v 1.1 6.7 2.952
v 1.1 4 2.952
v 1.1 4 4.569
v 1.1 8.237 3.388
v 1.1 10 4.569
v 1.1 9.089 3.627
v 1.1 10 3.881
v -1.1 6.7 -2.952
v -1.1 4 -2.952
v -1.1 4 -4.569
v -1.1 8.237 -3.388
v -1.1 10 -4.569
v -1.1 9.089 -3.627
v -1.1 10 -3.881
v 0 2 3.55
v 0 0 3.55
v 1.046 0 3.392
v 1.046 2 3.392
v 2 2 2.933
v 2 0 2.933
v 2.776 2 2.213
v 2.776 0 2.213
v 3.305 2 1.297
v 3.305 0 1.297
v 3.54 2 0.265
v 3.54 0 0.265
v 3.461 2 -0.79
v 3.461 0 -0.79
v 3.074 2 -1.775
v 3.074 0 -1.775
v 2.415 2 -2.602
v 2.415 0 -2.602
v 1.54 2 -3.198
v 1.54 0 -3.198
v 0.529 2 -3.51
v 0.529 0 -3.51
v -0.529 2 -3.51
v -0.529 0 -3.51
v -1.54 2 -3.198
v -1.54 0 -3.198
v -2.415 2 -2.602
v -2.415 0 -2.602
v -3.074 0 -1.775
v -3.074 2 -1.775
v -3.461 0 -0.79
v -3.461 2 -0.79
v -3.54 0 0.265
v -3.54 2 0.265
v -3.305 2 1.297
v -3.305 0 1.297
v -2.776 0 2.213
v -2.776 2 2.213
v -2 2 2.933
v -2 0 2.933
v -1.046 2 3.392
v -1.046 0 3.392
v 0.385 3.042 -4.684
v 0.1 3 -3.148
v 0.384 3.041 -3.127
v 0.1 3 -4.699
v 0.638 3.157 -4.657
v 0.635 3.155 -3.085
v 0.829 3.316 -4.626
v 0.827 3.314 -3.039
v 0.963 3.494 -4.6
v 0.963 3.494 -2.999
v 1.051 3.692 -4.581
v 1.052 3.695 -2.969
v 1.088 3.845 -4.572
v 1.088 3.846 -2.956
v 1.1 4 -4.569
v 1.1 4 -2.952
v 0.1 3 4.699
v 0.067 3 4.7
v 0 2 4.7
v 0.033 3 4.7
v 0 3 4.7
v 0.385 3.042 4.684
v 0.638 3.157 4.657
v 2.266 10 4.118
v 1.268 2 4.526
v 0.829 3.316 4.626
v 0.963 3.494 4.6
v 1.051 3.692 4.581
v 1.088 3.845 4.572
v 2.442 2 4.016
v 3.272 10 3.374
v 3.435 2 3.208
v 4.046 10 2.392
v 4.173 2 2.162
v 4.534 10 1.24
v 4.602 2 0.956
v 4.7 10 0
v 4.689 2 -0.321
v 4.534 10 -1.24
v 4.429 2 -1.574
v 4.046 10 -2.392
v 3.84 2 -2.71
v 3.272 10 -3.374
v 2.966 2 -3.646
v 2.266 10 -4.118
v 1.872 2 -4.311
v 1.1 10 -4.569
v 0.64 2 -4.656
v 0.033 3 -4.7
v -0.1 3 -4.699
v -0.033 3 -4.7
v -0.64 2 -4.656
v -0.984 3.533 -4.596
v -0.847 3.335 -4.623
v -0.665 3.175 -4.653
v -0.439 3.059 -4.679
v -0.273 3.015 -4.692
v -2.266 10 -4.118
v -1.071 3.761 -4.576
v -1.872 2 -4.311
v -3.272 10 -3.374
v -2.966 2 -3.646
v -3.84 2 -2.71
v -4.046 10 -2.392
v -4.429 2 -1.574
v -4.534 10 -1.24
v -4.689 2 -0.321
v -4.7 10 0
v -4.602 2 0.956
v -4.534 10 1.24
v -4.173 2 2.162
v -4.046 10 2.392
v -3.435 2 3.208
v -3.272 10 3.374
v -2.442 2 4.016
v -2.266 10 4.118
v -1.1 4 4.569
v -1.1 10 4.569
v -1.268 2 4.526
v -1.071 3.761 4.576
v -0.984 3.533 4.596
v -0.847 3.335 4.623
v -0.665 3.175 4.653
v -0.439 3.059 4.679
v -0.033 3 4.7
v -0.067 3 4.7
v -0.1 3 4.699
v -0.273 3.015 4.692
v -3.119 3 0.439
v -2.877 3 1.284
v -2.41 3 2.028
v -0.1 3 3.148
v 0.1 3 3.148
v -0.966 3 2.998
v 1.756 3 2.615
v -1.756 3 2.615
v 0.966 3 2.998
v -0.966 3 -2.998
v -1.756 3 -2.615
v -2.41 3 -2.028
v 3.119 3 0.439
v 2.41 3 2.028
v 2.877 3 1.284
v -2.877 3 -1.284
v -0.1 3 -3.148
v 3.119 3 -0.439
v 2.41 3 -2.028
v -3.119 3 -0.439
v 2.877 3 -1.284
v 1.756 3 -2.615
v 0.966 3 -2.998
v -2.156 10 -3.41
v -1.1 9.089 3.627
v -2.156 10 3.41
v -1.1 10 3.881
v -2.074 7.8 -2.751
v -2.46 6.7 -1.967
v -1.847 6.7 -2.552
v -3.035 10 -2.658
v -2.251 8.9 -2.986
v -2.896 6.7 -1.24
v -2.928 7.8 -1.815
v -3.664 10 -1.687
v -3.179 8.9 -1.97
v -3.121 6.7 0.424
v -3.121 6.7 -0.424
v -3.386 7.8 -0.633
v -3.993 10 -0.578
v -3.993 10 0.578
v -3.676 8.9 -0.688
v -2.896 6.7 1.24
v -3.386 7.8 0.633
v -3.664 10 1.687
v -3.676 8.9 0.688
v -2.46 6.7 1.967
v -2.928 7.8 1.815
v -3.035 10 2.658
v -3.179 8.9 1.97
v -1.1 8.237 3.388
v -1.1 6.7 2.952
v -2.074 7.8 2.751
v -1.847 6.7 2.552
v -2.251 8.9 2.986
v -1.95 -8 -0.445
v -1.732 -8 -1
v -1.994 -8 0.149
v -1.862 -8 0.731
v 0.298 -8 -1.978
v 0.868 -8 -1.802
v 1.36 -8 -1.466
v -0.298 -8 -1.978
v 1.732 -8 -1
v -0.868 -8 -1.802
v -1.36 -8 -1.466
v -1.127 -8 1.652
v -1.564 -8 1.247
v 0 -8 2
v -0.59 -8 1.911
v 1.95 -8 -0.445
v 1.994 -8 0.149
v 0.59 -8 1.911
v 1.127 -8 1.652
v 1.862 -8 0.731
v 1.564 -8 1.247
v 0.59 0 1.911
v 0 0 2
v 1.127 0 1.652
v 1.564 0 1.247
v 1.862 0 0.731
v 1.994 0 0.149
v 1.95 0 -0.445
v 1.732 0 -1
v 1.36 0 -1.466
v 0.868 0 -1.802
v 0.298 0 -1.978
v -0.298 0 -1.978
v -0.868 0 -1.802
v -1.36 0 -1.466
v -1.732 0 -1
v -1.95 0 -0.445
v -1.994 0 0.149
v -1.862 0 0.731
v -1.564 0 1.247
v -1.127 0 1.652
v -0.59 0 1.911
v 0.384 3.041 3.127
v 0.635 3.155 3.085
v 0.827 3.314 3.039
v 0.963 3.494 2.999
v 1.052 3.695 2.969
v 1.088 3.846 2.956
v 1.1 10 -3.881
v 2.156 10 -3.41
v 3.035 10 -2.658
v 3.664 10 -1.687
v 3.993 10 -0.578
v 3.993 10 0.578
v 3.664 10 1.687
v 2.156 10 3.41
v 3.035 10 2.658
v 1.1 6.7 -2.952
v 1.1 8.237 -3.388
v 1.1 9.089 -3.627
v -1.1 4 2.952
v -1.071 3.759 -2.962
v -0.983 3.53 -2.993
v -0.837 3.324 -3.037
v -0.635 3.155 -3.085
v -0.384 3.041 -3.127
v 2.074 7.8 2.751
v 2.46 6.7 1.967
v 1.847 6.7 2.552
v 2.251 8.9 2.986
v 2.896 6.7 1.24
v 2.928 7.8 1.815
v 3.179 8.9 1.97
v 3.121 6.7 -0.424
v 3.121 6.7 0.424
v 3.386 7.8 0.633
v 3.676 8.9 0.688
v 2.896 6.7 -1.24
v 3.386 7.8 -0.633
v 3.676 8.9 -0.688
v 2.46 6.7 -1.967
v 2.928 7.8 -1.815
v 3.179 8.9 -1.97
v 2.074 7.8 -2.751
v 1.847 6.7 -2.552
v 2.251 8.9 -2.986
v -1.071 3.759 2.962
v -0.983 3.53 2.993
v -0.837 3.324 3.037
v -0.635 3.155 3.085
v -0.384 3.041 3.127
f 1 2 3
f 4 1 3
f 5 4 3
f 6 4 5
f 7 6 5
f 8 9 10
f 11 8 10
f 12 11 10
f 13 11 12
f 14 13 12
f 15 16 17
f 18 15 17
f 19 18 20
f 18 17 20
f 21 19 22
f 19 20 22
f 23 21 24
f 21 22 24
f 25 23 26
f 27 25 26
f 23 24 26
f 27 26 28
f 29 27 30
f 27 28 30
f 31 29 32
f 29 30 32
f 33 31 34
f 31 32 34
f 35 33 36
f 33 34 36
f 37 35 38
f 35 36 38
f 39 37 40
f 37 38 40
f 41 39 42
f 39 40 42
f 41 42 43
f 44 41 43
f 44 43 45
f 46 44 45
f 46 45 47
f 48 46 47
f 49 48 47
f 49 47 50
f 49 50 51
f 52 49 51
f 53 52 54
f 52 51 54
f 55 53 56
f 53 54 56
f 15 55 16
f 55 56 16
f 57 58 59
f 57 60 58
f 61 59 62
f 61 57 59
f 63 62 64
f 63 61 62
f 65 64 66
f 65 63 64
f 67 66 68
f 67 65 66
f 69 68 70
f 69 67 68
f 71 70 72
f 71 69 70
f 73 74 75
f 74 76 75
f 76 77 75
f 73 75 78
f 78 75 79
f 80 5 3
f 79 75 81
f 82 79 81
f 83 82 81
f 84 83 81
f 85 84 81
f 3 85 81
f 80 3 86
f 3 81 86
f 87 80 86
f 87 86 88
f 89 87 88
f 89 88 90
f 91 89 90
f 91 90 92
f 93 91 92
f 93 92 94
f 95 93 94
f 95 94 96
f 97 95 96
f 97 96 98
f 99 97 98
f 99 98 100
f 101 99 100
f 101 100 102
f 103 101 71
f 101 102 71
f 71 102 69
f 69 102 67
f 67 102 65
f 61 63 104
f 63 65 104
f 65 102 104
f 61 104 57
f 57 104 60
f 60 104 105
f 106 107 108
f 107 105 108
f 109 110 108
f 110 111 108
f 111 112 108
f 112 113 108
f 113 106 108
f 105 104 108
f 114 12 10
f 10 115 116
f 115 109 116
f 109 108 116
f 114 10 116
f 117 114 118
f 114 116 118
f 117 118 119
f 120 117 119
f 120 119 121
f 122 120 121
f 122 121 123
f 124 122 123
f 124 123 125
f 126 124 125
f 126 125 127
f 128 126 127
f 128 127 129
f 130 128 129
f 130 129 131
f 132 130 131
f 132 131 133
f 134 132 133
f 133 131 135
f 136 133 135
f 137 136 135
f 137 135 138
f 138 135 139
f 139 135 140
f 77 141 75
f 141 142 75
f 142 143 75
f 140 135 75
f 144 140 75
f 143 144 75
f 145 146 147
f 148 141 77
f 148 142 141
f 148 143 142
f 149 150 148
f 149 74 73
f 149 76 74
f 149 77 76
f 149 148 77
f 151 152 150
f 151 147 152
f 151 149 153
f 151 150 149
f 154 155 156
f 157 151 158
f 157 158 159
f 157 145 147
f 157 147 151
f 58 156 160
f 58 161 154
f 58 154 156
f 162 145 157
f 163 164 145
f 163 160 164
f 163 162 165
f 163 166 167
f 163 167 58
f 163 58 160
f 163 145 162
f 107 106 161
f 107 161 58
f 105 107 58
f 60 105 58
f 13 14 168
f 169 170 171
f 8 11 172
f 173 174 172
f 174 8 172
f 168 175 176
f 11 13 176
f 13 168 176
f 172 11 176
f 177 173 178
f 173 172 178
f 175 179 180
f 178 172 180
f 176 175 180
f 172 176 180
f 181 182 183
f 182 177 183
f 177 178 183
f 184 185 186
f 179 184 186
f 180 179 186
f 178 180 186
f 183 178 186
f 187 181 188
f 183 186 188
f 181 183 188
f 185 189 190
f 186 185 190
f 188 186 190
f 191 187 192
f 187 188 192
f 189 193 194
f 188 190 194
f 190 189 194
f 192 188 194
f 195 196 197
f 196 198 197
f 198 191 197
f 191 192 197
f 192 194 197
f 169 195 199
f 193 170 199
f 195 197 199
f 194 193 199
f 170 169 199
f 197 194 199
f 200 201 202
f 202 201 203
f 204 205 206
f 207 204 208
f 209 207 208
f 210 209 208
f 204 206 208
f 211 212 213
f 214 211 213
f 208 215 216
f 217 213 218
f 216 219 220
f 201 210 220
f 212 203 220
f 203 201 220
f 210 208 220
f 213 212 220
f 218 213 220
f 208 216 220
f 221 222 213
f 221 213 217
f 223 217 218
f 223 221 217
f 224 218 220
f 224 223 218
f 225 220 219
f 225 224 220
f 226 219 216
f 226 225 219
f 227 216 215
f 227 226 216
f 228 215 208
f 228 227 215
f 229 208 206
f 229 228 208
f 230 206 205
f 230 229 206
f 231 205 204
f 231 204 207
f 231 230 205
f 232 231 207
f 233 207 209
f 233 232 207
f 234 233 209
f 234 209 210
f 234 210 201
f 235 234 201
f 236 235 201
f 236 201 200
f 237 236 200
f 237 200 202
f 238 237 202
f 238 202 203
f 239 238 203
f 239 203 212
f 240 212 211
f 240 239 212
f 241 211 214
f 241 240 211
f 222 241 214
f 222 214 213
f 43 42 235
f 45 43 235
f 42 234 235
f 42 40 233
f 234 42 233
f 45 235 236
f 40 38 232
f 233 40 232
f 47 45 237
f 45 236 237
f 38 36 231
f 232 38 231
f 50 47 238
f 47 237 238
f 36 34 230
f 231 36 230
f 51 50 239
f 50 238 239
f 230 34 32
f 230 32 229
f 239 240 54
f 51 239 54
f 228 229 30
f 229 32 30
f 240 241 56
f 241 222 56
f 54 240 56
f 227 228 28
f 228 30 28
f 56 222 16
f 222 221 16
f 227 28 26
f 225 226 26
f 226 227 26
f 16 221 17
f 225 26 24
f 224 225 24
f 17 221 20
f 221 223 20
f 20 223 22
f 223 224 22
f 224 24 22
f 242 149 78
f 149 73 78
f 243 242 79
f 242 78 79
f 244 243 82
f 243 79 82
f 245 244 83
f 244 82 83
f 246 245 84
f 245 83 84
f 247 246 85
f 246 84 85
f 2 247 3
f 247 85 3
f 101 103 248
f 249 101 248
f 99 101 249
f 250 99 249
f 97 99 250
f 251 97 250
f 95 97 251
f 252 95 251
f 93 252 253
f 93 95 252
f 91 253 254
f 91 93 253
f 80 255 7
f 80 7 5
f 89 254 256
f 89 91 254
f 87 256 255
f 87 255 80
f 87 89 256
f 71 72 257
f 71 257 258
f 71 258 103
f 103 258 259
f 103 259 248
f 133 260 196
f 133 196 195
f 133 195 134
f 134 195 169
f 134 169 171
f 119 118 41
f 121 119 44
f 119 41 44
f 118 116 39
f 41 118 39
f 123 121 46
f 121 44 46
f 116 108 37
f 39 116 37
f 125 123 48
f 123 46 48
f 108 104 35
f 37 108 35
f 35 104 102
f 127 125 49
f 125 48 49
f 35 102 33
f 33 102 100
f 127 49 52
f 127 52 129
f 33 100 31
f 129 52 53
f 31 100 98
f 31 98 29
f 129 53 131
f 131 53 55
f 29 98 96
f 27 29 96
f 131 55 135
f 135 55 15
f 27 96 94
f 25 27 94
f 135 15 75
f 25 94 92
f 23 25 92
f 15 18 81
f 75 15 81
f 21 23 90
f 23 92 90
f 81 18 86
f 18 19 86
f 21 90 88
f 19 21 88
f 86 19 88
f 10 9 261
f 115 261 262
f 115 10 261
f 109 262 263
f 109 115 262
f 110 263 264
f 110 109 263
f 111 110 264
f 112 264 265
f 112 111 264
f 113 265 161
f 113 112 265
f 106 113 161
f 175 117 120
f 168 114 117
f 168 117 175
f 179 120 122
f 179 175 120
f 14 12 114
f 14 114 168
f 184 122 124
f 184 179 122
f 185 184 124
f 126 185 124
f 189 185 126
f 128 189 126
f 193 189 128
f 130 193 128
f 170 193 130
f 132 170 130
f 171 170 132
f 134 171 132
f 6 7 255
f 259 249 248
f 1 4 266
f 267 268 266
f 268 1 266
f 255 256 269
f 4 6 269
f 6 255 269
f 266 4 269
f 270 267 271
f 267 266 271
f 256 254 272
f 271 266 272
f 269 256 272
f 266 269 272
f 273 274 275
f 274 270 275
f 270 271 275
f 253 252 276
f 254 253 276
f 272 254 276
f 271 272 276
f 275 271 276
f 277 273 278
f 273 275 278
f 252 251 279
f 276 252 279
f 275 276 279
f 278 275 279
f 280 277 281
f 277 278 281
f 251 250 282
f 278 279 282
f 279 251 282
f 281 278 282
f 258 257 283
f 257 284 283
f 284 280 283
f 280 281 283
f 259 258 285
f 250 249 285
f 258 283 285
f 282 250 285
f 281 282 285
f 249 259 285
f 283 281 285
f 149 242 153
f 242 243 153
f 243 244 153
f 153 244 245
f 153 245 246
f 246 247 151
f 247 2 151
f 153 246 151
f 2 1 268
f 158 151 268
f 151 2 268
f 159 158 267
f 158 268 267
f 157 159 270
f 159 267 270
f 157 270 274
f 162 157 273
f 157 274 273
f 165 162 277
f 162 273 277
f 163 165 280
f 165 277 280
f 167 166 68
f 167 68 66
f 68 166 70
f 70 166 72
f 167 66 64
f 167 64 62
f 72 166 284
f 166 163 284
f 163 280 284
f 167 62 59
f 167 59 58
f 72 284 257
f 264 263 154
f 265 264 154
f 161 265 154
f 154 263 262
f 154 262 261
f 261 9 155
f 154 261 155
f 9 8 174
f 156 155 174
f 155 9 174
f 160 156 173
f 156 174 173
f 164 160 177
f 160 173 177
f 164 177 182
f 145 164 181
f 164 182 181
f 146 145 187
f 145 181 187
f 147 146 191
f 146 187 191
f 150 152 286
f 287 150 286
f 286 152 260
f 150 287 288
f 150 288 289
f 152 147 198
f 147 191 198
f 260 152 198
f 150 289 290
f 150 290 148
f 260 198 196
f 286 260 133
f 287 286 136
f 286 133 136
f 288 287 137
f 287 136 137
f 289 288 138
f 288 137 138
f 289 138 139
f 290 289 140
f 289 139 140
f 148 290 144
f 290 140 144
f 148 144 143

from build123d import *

# Parameters (mm, degrees)
SKETCH1_R               = 2
BOSS_EXTRUDE1_DEPTH     = 8
SKETCH1_3_R             = 3.55
BOSS_EXTRUDE2_DEPTH     = 2
SKETCH2_R               = 4.7
BOSS_EXTRUDE3_DEPTH     = 8
CUT_EXTRUDE1_DEPTH      = 20.188017094
CUT_EXTRUDE1_DEPTH_BACK = 7
SKETCH3_R               = 3.15
CHAMFER1_SIZE           = 3.3
CHAMFER1_SIZE2          = 0.884232335
CUT_EXTRUDE2_DEPTH      = 13.007497658
CUT_EXTRUDE2_DEPTH_BACK = 13.007497658
SKETCH4_W               = 2.2
SKETCH4_H               = 7
FILLET1_R               = 1


with BuildPart() as part:
    # Sketch1 → Boss-Extrude1 (new body)
    with BuildSketch(Plane(origin=(0, 0, 0), x_dir=(1, 0, 0), z_dir=(0, 1, 0))):
        Circle(SKETCH1_R)
    extrude(amount=-BOSS_EXTRUDE1_DEPTH)

    # Sketch1<3> → Boss-Extrude2 (add)
    with BuildSketch(Plane(origin=(0, 0, 0), x_dir=(1, 0, 0), z_dir=(0, 1, 0))):
        Circle(SKETCH1_3_R)
    extrude(amount=BOSS_EXTRUDE2_DEPTH)

    # Sketch2 → Boss-Extrude3 (add)
    with BuildSketch(Plane(origin=(0, 2, 0), x_dir=(1, 0, 0), z_dir=(0, 1, 0))):
        Circle(SKETCH2_R)
    extrude(amount=BOSS_EXTRUDE3_DEPTH)

    # Sketch3 → Cut-Extrude1 (cut, two sides: drawn at the far end of the back side and taken through both)
    with BuildSketch(Plane(origin=(0, 10, 0), x_dir=(1, 0, 0), z_dir=(0, 1, 0)).offset(-CUT_EXTRUDE1_DEPTH_BACK)):
        Circle(SKETCH3_R)
    extrude(amount=CUT_EXTRUDE1_DEPTH + CUT_EXTRUDE1_DEPTH_BACK, mode=Mode.SUBTRACT)

    # Chamfer1
    chamfer1_edges = [part.edges().sort_by_distance(p)[0] for p in [
        (-3.15, 10, 0),
    ]]
    chamfer1_side = [part.faces().sort_by_distance(p)[0] for p in [
        (-3.15, 6.5, 0),
    ]]
    chamfer(chamfer1_edges, length=CHAMFER1_SIZE, length2=CHAMFER1_SIZE2, reference=chamfer1_side[0])

    # Sketch4 → Cut-Extrude2 (cut, two sides: drawn at the far end of the back side and taken through both)
    with BuildSketch(Plane.XY.offset(-CUT_EXTRUDE2_DEPTH_BACK)):
        with Locations((0, 6.5)):
            Rectangle(SKETCH4_W, SKETCH4_H)
    extrude(amount=CUT_EXTRUDE2_DEPTH + CUT_EXTRUDE2_DEPTH_BACK, mode=Mode.SUBTRACT)

    # Fillet1
    fillet1_edges = [part.edges().sort_by_distance(p)[0] for p in [
        (1.1, 3, -3.760579146),
        (-1.1, 3, -3.760579146),
        (1.1, 3, 3.760579146),
        (-1.1, 3, 3.760579146),
    ]]
    fillet(fillet1_edges, radius=FILLET1_R)


solid = part.part
